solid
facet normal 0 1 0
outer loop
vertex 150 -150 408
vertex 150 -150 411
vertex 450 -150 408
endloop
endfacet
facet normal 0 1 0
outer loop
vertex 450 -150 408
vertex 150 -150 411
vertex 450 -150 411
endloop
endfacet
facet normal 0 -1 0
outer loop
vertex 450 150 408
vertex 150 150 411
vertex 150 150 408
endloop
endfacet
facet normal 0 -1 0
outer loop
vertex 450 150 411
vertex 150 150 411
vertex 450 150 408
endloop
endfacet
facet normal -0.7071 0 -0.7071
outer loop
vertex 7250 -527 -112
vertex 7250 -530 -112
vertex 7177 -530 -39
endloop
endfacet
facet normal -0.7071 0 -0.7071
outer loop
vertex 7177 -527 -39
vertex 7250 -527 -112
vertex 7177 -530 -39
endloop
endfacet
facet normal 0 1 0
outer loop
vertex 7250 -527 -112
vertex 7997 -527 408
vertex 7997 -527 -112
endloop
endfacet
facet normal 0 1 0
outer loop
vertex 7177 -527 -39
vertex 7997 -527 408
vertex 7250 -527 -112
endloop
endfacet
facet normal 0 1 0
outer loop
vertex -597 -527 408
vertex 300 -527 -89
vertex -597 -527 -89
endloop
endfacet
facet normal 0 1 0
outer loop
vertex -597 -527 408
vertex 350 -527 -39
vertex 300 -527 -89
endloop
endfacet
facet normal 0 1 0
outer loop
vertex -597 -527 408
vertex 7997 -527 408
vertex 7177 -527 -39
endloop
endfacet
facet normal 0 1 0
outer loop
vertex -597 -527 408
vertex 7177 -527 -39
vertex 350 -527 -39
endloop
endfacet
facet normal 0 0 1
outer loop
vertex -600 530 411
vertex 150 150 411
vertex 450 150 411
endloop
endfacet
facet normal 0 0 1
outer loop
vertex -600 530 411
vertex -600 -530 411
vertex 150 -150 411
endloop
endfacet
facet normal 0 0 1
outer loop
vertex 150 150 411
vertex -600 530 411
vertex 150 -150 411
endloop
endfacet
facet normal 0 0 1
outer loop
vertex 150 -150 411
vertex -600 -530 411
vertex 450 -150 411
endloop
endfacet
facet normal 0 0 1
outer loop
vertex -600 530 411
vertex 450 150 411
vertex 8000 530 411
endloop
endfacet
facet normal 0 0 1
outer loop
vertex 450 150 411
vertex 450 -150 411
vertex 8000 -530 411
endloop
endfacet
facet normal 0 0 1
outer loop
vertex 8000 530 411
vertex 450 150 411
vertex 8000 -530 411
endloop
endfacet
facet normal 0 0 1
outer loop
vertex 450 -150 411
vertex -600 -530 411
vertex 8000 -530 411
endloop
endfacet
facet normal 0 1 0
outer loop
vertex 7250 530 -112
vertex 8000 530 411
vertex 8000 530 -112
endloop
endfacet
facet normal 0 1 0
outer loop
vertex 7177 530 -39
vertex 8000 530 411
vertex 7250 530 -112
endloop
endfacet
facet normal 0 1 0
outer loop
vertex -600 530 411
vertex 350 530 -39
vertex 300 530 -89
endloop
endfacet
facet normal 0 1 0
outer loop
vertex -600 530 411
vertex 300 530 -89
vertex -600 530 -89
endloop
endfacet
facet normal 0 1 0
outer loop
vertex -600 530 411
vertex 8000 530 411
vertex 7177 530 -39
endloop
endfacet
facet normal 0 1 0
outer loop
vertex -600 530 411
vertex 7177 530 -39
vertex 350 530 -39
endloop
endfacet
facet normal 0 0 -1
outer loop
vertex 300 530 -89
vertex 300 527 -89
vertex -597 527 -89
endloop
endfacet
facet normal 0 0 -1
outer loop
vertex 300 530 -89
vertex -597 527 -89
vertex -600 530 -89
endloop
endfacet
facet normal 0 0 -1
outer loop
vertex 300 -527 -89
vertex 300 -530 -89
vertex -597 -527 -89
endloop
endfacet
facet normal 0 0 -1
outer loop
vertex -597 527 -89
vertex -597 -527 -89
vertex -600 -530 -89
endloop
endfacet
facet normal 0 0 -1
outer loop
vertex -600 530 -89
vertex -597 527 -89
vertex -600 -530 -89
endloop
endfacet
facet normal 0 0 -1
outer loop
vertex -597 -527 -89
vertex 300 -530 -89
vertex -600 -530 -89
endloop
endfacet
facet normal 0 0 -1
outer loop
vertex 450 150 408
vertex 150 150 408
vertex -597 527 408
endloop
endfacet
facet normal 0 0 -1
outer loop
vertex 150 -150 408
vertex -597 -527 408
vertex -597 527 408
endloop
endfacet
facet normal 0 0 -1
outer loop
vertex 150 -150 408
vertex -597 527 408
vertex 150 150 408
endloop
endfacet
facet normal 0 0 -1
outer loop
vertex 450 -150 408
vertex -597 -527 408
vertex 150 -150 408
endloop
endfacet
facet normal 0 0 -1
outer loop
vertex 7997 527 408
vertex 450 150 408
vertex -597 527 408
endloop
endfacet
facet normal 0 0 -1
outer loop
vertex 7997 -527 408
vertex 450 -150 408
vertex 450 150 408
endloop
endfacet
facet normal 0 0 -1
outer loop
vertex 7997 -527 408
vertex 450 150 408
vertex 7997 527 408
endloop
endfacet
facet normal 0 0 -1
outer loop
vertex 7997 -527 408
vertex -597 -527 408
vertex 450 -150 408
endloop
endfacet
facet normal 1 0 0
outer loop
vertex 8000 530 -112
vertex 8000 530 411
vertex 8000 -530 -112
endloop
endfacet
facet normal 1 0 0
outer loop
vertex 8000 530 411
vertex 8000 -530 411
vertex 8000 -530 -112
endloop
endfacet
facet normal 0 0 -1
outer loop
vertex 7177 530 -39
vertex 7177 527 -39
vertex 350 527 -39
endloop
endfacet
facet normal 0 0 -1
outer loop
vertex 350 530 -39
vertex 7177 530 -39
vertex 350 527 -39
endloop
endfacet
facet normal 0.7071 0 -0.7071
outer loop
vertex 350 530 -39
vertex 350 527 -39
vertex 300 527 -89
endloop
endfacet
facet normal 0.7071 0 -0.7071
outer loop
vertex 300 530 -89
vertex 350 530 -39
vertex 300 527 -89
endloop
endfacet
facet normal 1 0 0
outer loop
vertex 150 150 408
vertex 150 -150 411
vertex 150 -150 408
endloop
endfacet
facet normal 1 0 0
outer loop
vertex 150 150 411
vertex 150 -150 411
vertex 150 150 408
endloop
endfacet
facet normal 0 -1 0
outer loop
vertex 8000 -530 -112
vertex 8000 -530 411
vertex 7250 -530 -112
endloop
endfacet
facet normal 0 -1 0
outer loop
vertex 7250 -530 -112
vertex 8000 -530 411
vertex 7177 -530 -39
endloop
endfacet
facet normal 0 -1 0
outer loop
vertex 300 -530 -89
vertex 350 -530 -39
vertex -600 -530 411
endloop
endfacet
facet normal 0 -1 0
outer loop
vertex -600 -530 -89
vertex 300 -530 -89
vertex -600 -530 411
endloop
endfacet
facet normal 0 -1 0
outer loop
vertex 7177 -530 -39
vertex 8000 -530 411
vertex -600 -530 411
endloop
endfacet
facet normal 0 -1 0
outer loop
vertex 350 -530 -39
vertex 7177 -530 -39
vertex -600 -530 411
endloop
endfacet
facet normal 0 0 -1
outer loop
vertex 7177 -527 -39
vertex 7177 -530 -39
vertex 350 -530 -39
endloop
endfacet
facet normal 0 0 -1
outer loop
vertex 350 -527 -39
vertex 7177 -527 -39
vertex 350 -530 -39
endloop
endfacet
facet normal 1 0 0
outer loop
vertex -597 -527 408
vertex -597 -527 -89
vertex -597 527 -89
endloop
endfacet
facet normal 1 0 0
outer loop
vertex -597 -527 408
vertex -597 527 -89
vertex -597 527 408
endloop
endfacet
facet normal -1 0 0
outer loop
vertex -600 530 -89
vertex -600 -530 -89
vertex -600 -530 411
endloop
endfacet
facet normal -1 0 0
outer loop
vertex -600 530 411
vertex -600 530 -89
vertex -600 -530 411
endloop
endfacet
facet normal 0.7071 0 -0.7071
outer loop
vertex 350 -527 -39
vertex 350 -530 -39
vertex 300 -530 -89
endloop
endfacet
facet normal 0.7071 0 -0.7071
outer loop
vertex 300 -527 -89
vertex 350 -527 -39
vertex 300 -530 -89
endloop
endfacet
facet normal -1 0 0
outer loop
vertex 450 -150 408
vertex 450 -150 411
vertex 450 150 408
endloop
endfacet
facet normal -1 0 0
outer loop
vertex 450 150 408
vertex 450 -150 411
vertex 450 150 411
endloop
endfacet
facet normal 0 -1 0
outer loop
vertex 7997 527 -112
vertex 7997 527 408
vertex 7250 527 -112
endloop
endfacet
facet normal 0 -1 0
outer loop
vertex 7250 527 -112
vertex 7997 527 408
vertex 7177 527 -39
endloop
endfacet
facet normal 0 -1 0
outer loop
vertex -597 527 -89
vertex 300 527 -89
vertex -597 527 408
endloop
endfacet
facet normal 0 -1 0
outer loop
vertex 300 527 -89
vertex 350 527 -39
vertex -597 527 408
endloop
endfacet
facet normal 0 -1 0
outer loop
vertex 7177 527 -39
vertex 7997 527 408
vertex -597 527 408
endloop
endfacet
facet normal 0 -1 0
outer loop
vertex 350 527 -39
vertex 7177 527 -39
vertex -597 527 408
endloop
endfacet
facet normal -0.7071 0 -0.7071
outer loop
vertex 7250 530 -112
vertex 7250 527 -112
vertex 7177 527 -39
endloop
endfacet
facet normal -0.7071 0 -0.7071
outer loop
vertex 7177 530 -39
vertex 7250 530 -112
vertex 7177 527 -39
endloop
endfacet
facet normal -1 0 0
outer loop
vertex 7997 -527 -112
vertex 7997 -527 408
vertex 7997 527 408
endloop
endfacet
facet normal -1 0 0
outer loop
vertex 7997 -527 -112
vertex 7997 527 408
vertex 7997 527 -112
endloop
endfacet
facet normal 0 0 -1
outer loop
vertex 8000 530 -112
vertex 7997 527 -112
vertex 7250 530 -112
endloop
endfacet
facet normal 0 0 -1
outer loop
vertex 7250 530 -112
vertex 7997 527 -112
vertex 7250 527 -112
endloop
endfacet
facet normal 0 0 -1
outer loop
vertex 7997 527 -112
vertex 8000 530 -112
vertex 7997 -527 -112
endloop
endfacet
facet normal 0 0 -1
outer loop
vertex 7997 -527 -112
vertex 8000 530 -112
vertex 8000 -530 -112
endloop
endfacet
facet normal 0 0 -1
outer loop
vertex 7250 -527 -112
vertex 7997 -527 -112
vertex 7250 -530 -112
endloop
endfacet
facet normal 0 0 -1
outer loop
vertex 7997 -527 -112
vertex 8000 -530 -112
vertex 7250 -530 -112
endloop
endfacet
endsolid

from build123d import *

# Parameters (mm, degrees)
SKETCH_W         = 300
SKETCH_H         = 300
EXTRUDE_DEPTH    = 10
EXTRUDE033_DEPTH = 527
EXTRUDE012_DEPTH = 530


with BuildPart() as extrude_body:
    # Sketch (on Face3 of Cut003) → Extrude (new body)
    with BuildSketch(Plane.XY.offset(411)):
        with Locations((300, 0)):
            Rectangle(SKETCH_W, SKETCH_H)
    extrude(amount=-EXTRUDE_DEPTH)


with BuildPart() as extrude033:
    # Sketch034 → Extrude033 (new body, symmetric)
    with BuildSketch(Plane.XZ):
        Polygon((-597, -89), (-597, 411), (7997, 411), (7997, -112), (7247, -112), (7174, -39), (350, -39), (300, -89), align=None)
    extrude(amount=EXTRUDE033_DEPTH, both=True)


with BuildPart() as extrude033_1:
    # Extrude033 placement: moved
    add(extrude033.part.moved(Location((0, 0, -3))))


with BuildPart() as cut:
    # Sketch020 → Extrude012 (new body, symmetric)
    with BuildSketch(Plane.XZ):
        Polygon((-600, -89), (-600, 411), (8000, 411), (8000, -112), (7250, -112), (7177, -39), (350, -39), (300, -89), align=None)
    extrude(amount=EXTRUDE012_DEPTH, both=True)

    # Cut003: cut Extrude033
    add(extrude033_1.part, mode=Mode.SUBTRACT)

    # Cut: cut Extrude body
    add(extrude_body.part, mode=Mode.SUBTRACT)


solid = cut.part
